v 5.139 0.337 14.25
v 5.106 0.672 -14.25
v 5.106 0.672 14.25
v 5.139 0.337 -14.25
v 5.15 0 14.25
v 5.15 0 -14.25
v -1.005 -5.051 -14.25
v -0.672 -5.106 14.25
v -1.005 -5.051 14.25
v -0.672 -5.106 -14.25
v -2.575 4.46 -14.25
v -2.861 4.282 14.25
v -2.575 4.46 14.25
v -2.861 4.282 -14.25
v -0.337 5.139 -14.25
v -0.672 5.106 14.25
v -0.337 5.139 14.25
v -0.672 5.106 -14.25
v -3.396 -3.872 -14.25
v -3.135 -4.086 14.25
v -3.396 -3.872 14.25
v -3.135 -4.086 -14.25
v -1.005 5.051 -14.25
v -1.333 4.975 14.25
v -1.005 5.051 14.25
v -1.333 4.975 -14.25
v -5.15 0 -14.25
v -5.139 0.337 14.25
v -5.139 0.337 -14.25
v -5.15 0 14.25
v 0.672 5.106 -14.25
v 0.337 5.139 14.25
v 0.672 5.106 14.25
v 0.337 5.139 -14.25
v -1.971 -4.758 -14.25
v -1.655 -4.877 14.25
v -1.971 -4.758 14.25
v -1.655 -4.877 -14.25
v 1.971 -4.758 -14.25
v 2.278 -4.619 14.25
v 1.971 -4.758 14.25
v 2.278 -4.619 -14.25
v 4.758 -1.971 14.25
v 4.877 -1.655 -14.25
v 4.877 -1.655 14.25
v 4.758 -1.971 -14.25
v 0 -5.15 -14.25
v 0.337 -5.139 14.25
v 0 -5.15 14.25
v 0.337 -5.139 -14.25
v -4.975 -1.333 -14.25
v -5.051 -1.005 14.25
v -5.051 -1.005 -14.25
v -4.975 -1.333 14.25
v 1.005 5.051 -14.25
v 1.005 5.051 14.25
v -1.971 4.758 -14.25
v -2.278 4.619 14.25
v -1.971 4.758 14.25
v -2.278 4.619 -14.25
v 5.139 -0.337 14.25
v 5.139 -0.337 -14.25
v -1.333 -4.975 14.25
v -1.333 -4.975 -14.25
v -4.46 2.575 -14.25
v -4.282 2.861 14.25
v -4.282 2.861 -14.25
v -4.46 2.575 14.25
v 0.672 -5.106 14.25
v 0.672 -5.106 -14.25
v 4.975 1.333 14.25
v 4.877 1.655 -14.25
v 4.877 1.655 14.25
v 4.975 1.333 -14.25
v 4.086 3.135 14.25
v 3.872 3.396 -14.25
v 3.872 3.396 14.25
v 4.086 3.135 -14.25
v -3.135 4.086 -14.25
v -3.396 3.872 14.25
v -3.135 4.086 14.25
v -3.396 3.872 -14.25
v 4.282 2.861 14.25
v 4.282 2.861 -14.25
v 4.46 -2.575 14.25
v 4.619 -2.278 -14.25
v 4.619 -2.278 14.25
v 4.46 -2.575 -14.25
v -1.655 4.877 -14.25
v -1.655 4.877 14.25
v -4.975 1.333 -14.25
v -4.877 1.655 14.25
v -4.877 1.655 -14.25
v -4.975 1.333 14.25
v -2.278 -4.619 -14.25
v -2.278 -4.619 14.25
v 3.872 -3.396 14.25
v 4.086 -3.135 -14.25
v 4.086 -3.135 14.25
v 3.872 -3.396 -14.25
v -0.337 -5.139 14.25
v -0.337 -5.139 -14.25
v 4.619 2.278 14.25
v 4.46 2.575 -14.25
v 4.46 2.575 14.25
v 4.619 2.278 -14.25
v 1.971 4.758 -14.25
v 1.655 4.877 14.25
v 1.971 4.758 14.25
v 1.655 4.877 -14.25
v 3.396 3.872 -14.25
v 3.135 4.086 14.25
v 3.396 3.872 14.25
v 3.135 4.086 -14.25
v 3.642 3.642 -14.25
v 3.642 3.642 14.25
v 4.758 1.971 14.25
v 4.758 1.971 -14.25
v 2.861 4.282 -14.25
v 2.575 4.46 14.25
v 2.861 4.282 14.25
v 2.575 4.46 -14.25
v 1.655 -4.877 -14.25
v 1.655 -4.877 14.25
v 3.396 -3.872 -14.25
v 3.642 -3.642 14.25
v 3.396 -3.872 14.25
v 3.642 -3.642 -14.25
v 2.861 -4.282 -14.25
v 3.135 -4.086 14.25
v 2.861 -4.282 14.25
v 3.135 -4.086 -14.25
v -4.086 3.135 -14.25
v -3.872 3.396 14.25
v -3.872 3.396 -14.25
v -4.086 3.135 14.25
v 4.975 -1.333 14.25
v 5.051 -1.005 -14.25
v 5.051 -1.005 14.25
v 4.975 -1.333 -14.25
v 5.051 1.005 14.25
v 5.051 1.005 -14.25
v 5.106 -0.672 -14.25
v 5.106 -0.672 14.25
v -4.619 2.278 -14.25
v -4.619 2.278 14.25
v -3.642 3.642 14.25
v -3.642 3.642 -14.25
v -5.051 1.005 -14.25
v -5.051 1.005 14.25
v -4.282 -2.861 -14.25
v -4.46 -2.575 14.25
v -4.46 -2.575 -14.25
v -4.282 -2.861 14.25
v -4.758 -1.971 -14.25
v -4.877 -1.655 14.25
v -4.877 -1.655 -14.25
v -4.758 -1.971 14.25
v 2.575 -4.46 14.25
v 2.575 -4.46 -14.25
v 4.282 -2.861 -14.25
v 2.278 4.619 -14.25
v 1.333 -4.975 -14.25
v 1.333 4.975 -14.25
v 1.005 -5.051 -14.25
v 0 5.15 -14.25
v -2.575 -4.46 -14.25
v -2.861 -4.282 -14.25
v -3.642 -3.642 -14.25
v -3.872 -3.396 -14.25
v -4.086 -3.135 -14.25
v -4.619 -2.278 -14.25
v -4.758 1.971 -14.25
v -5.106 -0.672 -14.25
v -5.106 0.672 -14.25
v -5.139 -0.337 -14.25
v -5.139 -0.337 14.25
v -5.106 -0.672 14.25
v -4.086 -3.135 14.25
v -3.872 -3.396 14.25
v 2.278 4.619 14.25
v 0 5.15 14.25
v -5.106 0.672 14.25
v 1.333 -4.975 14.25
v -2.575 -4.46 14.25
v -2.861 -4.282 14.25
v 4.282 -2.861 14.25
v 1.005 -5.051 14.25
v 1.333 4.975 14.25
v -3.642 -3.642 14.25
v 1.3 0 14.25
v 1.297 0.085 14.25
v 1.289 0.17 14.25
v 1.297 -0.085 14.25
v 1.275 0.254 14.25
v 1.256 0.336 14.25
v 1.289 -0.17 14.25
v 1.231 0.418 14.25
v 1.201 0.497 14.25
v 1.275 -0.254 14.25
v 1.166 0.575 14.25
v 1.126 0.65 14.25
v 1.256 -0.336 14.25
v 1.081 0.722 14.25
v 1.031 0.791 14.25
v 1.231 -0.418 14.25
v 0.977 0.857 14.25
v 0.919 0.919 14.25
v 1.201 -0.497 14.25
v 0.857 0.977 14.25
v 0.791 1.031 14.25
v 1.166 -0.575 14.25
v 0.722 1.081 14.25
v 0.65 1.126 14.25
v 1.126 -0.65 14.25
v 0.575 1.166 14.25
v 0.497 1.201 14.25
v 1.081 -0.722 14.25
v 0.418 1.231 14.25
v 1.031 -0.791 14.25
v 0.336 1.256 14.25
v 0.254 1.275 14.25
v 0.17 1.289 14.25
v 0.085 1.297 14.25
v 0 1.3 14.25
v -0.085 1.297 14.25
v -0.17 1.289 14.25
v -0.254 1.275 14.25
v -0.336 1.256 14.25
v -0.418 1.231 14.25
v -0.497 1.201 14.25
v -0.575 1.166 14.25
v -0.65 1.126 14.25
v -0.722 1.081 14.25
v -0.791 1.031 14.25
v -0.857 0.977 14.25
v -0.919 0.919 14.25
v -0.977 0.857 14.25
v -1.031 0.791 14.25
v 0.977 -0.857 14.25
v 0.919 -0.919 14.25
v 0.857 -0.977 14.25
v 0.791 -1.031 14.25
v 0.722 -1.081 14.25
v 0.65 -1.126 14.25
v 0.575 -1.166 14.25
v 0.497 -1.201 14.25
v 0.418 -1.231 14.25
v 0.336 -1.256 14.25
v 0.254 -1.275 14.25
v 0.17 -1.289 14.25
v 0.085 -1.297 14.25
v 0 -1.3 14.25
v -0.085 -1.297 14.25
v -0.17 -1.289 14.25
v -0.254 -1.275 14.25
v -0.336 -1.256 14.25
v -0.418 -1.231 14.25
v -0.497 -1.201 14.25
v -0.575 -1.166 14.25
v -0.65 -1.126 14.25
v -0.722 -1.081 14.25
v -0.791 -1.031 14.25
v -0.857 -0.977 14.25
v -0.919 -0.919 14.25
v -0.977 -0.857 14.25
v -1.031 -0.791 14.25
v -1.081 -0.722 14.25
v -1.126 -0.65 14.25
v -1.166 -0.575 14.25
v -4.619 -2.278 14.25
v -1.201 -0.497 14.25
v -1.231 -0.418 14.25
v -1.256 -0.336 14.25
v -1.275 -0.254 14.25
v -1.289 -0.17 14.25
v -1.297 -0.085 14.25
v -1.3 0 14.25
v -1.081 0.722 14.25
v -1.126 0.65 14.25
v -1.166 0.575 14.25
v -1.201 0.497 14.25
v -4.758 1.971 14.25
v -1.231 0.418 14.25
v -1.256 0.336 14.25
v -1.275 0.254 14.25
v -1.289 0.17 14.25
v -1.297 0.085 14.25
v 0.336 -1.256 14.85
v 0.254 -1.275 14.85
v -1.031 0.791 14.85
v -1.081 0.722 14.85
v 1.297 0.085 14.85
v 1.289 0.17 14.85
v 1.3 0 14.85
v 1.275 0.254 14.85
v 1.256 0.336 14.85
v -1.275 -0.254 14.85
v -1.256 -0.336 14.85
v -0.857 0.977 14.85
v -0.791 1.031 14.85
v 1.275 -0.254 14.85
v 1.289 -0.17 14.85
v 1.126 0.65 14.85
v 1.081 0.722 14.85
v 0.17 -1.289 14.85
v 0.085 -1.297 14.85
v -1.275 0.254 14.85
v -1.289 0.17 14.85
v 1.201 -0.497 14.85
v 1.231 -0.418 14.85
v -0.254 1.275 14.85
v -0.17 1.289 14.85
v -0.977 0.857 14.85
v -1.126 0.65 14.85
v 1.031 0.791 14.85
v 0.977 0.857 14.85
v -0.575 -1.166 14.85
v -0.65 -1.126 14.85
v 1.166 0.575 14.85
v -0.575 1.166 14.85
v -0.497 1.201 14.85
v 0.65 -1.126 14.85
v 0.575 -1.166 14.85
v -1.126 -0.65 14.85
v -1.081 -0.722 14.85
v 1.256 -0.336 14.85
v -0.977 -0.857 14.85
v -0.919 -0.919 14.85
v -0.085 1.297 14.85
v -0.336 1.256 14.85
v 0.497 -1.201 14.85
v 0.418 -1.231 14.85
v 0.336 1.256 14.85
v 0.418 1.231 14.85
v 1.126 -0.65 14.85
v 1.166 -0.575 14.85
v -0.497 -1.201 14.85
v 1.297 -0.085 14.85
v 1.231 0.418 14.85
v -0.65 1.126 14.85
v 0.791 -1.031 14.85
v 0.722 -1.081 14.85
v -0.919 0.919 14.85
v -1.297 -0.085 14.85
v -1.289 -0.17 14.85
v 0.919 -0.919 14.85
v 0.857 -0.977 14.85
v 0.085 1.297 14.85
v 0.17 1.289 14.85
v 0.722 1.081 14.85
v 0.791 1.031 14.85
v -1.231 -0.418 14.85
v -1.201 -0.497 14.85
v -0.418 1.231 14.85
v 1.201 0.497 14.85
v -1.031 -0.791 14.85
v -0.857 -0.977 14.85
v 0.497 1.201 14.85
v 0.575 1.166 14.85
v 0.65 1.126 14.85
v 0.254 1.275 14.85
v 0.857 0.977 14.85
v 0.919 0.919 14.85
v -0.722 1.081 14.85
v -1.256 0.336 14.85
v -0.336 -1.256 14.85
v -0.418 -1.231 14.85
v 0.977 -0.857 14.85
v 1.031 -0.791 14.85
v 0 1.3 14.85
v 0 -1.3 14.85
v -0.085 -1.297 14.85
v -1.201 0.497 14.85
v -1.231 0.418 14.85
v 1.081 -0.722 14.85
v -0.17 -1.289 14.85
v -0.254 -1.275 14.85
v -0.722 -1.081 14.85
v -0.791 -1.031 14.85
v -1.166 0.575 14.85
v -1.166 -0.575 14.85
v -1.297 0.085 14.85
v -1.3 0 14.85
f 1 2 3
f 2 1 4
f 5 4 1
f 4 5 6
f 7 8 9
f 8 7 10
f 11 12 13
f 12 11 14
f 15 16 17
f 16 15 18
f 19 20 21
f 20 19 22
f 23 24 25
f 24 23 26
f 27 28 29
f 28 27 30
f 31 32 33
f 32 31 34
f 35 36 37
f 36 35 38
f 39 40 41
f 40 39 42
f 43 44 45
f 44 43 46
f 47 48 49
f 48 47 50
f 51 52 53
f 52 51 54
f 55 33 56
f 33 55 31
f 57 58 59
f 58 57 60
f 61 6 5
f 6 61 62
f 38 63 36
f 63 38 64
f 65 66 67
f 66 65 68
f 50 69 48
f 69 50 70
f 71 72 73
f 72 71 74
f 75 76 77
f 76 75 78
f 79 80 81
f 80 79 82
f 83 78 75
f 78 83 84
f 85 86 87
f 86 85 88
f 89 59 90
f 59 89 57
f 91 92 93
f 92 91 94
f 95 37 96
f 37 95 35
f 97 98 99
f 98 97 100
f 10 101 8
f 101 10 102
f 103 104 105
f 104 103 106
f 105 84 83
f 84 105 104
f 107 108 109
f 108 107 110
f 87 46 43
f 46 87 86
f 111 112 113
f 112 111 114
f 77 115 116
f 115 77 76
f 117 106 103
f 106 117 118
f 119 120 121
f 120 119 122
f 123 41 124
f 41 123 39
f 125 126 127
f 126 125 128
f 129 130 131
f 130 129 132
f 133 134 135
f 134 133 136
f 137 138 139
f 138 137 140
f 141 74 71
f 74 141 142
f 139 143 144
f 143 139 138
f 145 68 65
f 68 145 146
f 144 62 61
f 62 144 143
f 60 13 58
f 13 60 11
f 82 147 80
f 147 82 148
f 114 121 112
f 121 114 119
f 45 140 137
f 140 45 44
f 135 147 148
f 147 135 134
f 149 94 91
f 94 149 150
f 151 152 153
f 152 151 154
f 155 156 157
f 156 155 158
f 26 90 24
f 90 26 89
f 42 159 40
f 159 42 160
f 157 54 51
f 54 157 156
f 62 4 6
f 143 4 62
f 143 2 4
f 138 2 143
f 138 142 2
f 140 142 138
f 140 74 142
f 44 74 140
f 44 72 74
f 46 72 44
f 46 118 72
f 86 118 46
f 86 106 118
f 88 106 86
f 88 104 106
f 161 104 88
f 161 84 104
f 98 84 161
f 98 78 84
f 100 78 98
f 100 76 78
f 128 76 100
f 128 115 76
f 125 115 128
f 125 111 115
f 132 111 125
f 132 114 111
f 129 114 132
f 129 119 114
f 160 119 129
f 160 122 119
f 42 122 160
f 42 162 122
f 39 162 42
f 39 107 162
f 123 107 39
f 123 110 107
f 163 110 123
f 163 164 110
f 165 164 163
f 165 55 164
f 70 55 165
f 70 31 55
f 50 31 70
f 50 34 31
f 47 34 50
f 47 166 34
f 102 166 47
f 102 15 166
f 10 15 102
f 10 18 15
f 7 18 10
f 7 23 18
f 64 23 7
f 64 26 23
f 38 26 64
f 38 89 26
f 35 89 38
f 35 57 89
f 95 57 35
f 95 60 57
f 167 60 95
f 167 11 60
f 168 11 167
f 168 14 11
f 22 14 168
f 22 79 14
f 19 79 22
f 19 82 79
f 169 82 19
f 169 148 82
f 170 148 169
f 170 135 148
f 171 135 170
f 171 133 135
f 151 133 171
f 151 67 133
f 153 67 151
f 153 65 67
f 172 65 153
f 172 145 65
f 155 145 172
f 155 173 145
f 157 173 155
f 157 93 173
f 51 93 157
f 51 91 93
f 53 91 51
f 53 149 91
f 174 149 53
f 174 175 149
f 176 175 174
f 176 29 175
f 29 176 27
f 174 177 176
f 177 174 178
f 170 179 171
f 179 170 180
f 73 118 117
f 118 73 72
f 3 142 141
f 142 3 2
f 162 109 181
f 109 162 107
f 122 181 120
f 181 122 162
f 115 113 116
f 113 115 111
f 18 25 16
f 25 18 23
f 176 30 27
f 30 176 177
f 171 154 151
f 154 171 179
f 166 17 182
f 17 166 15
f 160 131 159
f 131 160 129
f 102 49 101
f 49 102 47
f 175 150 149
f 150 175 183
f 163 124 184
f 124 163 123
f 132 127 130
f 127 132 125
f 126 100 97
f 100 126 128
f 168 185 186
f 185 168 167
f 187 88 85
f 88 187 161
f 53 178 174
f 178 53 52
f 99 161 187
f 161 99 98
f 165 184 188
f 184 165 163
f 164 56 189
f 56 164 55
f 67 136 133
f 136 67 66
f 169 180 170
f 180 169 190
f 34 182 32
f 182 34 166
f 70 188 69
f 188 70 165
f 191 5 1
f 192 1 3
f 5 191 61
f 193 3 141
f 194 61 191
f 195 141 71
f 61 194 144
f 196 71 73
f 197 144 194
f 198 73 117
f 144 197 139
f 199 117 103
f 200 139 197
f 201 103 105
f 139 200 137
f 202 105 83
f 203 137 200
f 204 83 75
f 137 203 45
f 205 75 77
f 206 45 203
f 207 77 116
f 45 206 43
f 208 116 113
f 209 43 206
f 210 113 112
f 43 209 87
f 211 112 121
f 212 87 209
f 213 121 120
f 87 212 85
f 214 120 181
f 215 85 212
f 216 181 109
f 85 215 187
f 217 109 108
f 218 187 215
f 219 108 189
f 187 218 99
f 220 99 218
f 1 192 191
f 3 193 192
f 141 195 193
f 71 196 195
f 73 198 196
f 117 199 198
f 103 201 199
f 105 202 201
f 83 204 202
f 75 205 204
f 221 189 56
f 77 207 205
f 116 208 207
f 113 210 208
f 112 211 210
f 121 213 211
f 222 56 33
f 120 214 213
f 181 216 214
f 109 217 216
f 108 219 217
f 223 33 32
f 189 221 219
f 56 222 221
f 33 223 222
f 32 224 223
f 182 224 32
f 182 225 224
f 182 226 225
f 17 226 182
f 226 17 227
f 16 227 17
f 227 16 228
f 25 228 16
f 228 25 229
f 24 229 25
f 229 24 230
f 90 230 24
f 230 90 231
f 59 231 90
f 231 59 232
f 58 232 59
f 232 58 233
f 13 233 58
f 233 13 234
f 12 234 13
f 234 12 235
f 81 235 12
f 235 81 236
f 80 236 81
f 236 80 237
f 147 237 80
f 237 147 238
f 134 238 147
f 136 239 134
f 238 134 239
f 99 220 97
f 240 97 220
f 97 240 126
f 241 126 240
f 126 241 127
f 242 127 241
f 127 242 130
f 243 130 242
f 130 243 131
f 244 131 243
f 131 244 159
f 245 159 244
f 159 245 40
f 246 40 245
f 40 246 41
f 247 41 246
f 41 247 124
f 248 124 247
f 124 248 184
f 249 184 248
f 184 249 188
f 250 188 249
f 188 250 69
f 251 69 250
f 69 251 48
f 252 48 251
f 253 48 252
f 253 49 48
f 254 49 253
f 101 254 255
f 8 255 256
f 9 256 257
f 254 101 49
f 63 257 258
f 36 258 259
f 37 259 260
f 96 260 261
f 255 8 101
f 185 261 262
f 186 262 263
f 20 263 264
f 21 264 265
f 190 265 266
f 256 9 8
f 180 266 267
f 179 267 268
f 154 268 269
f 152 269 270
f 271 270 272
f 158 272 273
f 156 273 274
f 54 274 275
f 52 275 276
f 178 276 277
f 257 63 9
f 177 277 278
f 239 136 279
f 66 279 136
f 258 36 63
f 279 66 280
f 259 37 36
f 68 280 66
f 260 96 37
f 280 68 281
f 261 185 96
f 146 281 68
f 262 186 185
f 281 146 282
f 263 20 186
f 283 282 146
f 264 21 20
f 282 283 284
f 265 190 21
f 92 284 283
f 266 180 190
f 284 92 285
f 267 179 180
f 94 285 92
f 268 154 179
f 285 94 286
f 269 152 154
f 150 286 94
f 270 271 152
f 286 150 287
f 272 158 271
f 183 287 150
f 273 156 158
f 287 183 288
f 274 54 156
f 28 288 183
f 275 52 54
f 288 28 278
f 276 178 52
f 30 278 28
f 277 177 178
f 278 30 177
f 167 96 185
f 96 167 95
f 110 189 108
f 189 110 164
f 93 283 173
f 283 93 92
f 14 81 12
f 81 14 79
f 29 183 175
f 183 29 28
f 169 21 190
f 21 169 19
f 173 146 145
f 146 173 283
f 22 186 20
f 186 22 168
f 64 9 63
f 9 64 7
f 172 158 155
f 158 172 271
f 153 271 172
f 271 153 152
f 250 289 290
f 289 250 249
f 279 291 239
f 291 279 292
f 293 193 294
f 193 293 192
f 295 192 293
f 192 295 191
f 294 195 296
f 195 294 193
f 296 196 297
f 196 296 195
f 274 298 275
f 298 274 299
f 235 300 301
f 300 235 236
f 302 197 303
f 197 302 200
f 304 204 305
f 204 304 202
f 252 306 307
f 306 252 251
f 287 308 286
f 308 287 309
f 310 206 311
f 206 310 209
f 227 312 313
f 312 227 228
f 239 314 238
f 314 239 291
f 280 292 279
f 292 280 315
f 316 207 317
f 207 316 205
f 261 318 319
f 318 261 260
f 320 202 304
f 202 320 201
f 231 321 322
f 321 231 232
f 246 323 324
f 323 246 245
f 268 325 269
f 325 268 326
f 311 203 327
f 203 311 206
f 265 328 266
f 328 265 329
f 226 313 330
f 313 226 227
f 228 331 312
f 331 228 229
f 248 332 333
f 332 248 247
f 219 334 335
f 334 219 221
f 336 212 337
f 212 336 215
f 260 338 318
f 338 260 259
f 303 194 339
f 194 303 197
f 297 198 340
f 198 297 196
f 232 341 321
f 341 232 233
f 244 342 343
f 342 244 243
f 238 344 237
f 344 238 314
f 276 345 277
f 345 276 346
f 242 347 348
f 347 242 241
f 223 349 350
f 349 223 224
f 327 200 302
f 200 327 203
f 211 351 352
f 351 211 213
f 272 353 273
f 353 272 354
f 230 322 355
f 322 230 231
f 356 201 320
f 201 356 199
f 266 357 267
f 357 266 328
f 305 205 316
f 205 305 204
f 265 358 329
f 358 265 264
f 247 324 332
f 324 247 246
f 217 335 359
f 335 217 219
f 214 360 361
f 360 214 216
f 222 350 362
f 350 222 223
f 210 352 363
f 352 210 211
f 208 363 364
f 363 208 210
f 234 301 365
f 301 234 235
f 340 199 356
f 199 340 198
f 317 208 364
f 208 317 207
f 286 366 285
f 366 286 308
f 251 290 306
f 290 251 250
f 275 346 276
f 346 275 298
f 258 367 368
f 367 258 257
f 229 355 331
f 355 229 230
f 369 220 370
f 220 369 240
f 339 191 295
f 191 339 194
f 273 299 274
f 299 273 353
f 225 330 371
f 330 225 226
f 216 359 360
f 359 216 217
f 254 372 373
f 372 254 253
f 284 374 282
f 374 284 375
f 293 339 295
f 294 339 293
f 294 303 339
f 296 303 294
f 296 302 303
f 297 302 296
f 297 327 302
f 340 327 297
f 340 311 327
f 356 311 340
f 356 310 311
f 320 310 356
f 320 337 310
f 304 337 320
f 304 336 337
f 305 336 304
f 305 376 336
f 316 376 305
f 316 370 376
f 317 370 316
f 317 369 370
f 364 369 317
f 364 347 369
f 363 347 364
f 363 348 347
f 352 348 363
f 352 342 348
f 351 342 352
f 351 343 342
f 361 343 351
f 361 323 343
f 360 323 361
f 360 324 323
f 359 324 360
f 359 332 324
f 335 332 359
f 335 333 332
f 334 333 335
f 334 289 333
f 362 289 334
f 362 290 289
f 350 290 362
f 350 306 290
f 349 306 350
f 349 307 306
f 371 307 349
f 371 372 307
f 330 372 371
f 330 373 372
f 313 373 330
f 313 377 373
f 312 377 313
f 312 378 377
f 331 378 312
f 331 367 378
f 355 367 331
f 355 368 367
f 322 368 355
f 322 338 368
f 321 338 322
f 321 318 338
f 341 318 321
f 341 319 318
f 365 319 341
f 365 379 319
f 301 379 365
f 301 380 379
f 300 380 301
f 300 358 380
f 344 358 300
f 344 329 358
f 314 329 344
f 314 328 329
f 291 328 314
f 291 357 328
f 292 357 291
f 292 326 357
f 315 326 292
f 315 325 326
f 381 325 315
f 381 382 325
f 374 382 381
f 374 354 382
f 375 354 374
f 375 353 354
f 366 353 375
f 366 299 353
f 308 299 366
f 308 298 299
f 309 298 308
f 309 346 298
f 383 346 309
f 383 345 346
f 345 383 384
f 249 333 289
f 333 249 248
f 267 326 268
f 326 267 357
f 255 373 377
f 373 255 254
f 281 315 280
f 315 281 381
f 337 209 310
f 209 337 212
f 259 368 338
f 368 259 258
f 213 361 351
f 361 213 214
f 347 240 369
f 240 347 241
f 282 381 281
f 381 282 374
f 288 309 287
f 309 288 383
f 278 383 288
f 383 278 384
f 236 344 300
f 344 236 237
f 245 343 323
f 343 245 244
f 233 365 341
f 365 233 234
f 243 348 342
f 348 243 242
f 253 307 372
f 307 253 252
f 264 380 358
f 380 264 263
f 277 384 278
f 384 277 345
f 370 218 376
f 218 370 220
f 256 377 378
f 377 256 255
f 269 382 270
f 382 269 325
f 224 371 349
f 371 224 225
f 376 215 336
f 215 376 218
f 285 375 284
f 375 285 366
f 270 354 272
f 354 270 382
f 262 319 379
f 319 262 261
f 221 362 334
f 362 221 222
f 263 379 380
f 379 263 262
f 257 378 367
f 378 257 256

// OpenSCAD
$fn=96;

module battery_cell(h=28.5, d=10.3, cap_h=1.2, cap_d=4.8, nub_h=0.6, nub_d=2.6) {
    union() {
        translate([0,0,-h/2]) cylinder(h=h, d=d);
        translate([0,0,h/2 - cap_h]) cylinder(h=cap_h, d=cap_d);
        translate([0,0,h/2]) cylinder(h=nub_h, d=nub_d);
    }
}

battery_cell();
